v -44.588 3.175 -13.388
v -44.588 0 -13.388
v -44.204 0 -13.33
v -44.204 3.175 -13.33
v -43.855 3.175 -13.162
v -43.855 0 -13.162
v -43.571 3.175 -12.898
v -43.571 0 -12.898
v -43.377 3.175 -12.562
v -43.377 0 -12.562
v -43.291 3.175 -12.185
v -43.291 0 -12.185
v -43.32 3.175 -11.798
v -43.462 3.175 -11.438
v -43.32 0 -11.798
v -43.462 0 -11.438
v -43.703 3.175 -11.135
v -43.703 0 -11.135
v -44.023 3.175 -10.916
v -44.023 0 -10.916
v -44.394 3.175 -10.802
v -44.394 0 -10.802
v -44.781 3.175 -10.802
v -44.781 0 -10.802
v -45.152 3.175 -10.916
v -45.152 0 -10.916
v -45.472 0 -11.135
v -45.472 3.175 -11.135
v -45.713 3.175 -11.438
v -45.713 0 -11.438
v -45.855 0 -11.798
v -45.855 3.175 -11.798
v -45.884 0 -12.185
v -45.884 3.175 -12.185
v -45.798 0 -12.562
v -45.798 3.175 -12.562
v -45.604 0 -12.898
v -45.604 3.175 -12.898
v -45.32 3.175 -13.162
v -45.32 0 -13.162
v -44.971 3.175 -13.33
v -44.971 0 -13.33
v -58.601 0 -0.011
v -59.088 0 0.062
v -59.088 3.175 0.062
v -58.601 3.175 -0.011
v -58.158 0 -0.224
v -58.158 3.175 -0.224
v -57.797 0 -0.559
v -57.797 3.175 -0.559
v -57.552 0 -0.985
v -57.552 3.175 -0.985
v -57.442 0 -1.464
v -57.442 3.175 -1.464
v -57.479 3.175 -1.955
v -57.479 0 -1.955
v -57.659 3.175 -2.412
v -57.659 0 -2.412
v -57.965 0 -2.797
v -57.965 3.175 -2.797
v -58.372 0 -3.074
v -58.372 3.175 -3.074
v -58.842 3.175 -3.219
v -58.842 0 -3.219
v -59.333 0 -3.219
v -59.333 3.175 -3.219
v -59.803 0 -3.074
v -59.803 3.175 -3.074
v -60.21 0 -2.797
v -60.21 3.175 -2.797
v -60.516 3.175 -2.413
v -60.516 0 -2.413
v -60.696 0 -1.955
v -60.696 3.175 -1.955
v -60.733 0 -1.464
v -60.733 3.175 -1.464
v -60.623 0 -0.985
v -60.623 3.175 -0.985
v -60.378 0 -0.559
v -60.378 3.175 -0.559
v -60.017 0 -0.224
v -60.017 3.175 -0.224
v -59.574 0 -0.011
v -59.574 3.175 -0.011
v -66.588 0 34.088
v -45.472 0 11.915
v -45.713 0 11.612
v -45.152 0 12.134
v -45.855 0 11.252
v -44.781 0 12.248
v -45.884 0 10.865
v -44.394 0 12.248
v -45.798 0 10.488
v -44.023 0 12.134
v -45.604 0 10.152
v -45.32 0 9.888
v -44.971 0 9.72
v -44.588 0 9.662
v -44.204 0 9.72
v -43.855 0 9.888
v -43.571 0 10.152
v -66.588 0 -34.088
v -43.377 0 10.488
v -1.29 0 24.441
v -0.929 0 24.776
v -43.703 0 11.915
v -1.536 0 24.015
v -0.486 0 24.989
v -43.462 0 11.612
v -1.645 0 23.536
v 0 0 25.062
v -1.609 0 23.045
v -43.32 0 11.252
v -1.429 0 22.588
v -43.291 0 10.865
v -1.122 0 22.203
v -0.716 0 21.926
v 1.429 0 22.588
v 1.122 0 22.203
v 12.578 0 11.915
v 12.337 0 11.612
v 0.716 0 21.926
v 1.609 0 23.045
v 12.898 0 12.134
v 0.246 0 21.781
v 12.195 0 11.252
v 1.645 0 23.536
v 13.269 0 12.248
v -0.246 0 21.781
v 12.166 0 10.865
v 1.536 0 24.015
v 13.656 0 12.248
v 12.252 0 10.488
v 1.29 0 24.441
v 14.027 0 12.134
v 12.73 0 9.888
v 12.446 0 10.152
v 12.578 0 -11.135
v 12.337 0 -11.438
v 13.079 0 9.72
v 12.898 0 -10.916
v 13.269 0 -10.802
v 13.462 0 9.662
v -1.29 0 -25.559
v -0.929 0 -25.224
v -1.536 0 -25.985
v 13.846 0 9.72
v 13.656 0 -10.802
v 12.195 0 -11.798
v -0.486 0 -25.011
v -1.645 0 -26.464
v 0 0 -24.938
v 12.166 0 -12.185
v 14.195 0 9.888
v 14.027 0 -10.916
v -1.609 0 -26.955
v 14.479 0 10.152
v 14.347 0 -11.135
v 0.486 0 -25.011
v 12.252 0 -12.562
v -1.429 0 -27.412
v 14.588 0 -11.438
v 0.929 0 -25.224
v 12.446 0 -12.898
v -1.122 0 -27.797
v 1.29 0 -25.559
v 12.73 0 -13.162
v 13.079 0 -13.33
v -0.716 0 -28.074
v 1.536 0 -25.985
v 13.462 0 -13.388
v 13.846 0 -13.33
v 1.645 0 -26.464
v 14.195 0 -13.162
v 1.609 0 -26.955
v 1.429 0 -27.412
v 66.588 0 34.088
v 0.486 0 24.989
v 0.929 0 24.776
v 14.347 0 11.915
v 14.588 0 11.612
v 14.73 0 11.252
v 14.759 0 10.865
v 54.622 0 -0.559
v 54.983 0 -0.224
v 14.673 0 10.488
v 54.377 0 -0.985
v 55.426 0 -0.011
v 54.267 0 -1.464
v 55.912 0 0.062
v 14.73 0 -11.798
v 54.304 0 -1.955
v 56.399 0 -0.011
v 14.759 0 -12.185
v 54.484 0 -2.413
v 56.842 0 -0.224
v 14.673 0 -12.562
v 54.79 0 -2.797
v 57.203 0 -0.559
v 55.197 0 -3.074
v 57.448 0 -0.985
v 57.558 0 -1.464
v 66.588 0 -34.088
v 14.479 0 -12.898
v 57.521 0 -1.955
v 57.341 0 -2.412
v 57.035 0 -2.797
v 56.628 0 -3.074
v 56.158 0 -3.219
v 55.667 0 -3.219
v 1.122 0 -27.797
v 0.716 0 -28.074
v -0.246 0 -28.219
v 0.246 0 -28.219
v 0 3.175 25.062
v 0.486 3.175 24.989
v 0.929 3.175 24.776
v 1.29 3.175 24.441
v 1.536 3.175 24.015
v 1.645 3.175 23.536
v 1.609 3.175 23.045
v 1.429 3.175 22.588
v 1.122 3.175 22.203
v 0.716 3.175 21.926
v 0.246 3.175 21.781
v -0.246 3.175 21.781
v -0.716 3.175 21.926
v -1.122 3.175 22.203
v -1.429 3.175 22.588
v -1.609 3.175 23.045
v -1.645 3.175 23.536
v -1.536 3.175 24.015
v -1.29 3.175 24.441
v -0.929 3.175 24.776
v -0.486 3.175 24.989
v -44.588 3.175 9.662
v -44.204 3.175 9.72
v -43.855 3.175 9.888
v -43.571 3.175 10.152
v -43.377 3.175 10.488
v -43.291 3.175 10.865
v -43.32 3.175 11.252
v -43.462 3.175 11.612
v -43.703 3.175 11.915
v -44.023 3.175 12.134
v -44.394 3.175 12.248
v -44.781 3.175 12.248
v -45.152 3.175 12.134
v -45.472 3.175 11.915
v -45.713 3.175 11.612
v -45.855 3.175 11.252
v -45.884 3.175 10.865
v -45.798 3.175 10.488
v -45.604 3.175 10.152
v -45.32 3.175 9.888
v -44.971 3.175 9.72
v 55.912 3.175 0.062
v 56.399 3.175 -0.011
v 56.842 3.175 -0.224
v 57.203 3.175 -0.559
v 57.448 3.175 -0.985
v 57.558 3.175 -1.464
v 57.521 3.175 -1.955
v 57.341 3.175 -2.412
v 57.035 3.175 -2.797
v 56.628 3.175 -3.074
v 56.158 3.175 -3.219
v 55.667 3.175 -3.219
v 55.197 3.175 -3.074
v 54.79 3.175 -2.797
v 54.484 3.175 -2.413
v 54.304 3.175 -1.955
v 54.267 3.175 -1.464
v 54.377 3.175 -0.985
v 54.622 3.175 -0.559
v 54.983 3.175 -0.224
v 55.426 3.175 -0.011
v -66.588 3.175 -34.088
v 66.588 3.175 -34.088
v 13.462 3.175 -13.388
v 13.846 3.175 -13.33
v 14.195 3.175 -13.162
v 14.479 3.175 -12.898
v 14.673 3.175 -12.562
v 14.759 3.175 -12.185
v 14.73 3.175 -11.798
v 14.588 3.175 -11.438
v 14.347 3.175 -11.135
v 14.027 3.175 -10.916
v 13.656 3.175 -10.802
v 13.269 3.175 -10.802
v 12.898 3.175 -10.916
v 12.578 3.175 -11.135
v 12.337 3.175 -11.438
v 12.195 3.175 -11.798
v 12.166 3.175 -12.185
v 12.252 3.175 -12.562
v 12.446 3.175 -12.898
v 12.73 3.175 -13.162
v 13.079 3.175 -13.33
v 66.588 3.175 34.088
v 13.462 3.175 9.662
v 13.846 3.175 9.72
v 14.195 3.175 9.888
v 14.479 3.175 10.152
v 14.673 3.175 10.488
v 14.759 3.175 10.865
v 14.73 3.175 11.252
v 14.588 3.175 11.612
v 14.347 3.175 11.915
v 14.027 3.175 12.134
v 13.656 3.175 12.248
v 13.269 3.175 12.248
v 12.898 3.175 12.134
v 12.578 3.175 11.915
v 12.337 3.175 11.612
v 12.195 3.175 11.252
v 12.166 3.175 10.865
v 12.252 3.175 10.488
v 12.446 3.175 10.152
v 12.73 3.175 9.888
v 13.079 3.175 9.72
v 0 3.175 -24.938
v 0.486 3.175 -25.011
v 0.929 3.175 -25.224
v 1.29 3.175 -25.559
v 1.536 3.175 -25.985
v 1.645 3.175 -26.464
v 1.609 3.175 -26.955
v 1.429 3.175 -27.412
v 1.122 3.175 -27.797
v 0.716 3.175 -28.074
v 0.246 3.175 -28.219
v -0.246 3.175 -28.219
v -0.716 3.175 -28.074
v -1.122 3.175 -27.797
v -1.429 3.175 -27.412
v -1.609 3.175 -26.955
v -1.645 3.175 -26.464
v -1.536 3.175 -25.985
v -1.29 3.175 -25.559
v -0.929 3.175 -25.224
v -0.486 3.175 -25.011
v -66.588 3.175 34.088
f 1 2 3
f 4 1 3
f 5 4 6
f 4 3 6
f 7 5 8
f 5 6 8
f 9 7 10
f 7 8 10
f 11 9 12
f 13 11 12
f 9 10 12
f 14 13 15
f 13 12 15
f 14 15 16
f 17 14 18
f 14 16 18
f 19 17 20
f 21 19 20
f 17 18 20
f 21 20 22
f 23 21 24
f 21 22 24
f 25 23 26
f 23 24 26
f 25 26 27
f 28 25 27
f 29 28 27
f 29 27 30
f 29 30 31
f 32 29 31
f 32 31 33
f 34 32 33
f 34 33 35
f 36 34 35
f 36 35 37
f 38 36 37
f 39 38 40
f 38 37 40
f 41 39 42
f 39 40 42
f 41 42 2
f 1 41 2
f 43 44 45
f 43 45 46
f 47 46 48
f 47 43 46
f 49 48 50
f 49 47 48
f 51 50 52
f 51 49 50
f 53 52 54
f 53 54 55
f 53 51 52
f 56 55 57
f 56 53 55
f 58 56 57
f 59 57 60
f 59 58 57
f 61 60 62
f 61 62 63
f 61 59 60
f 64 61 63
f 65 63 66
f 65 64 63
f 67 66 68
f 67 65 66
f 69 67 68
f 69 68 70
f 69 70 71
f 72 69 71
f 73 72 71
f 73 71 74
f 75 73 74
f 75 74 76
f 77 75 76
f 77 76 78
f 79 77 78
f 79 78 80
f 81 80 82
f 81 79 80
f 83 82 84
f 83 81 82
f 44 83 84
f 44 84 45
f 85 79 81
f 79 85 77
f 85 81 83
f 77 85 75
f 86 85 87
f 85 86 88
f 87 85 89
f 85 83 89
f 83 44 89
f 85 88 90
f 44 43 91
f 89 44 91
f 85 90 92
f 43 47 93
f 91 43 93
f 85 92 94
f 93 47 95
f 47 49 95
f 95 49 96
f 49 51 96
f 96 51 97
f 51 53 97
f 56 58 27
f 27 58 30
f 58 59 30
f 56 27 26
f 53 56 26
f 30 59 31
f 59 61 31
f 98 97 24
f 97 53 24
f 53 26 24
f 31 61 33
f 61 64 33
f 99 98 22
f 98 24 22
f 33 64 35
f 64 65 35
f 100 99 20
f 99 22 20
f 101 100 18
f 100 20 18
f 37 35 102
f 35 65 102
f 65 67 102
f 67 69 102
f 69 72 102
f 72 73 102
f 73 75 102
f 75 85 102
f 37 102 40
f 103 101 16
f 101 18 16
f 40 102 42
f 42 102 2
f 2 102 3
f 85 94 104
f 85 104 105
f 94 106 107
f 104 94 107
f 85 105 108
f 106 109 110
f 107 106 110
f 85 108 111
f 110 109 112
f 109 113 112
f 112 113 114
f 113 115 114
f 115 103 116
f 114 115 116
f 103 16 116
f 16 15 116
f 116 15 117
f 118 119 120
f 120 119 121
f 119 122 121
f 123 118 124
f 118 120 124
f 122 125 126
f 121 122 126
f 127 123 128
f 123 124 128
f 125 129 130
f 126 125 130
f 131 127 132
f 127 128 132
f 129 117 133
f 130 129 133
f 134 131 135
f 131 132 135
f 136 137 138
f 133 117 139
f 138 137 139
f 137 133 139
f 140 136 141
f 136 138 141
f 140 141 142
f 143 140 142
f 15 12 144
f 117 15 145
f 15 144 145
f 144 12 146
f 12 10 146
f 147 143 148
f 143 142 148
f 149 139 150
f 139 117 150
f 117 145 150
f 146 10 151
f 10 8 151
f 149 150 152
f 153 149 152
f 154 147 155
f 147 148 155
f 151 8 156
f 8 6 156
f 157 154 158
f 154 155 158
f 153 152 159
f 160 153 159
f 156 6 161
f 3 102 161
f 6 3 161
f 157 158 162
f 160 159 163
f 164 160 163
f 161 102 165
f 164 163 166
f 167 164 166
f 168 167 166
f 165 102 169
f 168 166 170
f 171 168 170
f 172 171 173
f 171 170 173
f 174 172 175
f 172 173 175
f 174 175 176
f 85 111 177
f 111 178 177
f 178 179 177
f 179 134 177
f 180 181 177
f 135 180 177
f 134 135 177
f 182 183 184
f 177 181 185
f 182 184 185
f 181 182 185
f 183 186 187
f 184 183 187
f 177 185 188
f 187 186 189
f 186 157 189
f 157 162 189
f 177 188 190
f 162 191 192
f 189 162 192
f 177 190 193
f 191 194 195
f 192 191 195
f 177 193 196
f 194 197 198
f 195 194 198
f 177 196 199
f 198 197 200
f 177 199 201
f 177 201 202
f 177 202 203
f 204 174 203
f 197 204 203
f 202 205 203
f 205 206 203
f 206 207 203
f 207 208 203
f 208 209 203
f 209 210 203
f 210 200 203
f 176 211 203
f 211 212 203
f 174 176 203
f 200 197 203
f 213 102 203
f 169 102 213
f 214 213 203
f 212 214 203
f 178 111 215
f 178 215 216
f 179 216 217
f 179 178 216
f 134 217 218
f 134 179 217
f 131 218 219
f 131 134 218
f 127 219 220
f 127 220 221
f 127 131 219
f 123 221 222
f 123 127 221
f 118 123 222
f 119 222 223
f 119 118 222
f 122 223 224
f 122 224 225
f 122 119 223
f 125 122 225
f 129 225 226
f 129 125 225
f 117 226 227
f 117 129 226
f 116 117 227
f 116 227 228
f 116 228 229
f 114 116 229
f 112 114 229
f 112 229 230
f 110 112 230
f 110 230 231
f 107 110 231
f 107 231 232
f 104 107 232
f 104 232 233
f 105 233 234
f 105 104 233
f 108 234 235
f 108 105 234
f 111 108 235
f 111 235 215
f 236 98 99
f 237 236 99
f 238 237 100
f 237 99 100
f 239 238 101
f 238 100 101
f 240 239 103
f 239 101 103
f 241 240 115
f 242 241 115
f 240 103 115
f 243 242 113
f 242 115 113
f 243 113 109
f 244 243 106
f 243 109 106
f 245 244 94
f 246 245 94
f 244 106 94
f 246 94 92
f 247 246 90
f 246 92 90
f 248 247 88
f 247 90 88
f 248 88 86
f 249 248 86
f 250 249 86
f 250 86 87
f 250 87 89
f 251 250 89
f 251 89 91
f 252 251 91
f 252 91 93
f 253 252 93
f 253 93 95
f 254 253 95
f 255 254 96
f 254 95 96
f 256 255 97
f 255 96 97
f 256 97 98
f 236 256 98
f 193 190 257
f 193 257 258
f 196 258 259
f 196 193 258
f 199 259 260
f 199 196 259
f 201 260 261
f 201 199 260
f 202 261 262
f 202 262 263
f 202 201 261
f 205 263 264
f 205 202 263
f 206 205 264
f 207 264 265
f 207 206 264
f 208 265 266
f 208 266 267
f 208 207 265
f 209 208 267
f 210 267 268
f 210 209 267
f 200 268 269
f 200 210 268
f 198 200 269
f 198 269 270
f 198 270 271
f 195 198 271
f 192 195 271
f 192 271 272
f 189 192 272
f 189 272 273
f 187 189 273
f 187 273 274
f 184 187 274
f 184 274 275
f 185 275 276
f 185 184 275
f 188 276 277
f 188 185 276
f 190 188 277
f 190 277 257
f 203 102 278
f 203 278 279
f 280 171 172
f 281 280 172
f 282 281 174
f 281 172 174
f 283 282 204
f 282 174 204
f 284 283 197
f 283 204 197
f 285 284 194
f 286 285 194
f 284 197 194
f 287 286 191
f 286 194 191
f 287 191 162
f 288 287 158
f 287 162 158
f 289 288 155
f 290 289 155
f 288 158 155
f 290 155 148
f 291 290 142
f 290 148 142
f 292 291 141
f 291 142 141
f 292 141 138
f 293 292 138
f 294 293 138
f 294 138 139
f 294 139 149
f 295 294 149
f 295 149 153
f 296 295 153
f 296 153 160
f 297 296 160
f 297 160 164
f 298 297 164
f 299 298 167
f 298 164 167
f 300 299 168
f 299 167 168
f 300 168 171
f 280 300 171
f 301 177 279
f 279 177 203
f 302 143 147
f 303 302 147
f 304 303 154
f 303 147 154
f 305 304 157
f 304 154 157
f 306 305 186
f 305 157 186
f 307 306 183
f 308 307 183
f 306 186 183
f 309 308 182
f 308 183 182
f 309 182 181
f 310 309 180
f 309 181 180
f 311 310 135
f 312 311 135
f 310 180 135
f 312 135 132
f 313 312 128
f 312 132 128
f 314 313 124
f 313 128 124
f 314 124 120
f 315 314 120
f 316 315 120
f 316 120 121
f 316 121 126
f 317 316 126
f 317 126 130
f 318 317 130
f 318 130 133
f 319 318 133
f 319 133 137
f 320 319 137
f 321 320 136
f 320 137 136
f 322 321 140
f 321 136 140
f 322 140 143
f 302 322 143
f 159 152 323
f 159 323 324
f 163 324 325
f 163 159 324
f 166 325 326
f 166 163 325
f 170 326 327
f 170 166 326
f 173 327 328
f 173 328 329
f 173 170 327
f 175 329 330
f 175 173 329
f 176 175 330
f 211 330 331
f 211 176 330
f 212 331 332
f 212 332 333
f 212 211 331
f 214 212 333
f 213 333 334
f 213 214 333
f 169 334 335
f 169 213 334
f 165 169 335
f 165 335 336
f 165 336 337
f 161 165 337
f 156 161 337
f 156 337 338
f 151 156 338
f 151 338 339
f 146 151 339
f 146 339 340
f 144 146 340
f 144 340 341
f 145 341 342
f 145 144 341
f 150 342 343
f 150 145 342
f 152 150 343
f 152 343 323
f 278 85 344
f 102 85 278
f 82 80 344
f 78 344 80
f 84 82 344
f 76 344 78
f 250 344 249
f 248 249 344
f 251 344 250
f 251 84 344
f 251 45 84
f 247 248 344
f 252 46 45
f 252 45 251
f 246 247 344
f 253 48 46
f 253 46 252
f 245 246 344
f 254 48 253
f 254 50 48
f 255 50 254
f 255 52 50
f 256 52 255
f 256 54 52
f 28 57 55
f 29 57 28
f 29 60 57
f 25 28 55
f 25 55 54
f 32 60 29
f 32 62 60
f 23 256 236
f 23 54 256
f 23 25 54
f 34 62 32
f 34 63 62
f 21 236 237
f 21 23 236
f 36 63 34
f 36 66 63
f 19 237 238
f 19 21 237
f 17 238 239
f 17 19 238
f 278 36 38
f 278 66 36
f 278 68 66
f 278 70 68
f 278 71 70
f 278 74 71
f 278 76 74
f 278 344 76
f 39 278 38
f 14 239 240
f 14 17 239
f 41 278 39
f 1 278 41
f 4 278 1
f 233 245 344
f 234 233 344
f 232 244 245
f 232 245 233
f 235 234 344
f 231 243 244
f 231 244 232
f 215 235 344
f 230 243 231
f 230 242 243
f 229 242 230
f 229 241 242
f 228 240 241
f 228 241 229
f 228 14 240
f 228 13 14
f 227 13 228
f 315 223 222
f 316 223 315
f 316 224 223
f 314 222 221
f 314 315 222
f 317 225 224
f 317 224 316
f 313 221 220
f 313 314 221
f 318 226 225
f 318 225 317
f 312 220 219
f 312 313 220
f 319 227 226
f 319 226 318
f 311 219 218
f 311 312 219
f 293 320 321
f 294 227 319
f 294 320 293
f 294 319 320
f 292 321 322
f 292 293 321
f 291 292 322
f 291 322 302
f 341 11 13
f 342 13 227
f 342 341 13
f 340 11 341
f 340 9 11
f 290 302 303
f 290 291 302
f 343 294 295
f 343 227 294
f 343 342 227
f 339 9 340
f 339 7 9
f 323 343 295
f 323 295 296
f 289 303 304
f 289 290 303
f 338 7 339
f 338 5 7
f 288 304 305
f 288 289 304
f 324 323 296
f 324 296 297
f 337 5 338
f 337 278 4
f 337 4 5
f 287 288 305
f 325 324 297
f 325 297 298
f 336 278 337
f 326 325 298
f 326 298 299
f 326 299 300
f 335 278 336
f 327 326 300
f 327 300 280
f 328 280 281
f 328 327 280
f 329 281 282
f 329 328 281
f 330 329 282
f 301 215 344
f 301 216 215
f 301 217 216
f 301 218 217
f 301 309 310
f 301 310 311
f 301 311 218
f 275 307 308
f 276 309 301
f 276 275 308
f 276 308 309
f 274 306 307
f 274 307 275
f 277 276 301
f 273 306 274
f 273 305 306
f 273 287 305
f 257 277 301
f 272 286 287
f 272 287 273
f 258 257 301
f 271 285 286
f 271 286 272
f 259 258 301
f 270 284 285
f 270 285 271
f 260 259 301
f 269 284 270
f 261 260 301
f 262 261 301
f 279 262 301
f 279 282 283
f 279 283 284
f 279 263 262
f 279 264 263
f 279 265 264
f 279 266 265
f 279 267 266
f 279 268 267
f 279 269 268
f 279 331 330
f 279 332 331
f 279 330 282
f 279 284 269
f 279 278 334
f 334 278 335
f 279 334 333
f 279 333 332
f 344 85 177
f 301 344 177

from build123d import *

# Parameters (mm, degrees)
SKETCH1_W           = 133.175
SKETCH1_H           = 68.175
SKETCH1_R           = 1.65
BOSS_EXTRUDE1_DEPTH = 3.175
SKETCH2_R           = 1.3
CUT_EXTRUDE1_DEPTH  = 3.175


with BuildPart() as part:
    # Sketch1 → Boss-Extrude1 (new body)
    with BuildSketch(Plane(origin=(0, 0, 0), x_dir=(1, 0, 0), z_dir=(0, 1, 0))):
        Rectangle(SKETCH1_W, SKETCH1_H)
        with Locations(Location((0, 26.5875, 0), (0, 0, 270))):
            Circle(SKETCH1_R, mode=Mode.SUBTRACT)
        with Locations(Location((-59.0875, 1.5875, 0), (0, 0, 270))):
            Circle(SKETCH1_R, mode=Mode.SUBTRACT)
        with Locations(Location((55.9125, 1.5875, 0), (0, 0, 270))):
            Circle(SKETCH1_R, mode=Mode.SUBTRACT)
        with Locations(Location((0, -23.4125, 0), (0, 0, 270))):
            Circle(SKETCH1_R, mode=Mode.SUBTRACT)
    extrude(amount=BOSS_EXTRUDE1_DEPTH)

    # Sketch2 → Cut-Extrude1 (cut)
    with BuildSketch(Plane.XZ):
        with Locations(Location((-44.5875, 10.9625, 0), (0, 0, 270))):
            Circle(SKETCH2_R)
        with Locations(Location((-44.5875, -12.0875, 0), (0, 0, 270))):
            Circle(SKETCH2_R)
        with Locations(Location((13.4625, -12.0875, 0), (0, 0, 270))):
            Circle(SKETCH2_R)
        with Locations(Location((13.4625, 10.9625, 0), (0, 0, 270))):
            Circle(SKETCH2_R)
    extrude(amount=-CUT_EXTRUDE1_DEPTH, mode=Mode.SUBTRACT)


solid = part.part
